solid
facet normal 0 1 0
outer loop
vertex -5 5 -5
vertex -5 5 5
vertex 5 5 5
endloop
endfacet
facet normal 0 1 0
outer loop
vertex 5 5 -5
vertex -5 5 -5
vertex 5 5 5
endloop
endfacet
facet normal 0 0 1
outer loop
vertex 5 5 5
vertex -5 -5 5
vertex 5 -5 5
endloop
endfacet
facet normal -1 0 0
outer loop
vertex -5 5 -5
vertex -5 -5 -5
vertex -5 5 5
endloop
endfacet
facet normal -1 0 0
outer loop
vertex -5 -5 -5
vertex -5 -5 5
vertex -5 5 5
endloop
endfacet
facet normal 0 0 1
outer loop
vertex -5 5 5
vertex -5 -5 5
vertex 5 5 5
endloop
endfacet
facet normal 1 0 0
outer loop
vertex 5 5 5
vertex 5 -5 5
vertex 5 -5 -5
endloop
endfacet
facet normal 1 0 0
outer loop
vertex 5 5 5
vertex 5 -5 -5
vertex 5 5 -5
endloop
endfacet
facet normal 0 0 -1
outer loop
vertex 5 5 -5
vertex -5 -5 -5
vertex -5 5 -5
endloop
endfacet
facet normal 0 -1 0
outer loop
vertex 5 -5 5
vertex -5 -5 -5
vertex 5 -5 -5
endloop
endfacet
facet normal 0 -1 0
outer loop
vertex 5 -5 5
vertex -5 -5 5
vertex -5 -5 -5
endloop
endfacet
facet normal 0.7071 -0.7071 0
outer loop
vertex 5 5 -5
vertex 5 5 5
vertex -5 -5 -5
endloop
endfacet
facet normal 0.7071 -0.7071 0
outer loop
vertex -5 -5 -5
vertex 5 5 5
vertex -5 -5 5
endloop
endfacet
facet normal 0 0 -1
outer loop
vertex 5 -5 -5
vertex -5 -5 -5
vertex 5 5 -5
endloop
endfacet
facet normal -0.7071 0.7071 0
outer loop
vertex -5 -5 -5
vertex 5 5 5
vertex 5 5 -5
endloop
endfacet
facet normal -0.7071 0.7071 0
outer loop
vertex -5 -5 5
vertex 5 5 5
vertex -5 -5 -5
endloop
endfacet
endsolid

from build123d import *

# Parameters (mm, degrees)
EXTRUDE_1_DEPTH = 5


with BuildPart() as part:
    # 草图1 → 凸台-拉伸1 (new body, symmetric)
    with BuildSketch(Plane.XY):
        Polygon((-5, -5), (5, -5), (5, 5), align=None)
    extrude(amount=EXTRUDE_1_DEPTH, both=True)


with BuildPart() as body_2:
    # 镜向2: mirrored copy
    add(part.part.mirror(Plane(origin=(5, 5, 5), x_dir=(0, 0, 1), z_dir=(0.707106781, -0.707106781, 0))))


solid = Compound([part.part, body_2.part])
